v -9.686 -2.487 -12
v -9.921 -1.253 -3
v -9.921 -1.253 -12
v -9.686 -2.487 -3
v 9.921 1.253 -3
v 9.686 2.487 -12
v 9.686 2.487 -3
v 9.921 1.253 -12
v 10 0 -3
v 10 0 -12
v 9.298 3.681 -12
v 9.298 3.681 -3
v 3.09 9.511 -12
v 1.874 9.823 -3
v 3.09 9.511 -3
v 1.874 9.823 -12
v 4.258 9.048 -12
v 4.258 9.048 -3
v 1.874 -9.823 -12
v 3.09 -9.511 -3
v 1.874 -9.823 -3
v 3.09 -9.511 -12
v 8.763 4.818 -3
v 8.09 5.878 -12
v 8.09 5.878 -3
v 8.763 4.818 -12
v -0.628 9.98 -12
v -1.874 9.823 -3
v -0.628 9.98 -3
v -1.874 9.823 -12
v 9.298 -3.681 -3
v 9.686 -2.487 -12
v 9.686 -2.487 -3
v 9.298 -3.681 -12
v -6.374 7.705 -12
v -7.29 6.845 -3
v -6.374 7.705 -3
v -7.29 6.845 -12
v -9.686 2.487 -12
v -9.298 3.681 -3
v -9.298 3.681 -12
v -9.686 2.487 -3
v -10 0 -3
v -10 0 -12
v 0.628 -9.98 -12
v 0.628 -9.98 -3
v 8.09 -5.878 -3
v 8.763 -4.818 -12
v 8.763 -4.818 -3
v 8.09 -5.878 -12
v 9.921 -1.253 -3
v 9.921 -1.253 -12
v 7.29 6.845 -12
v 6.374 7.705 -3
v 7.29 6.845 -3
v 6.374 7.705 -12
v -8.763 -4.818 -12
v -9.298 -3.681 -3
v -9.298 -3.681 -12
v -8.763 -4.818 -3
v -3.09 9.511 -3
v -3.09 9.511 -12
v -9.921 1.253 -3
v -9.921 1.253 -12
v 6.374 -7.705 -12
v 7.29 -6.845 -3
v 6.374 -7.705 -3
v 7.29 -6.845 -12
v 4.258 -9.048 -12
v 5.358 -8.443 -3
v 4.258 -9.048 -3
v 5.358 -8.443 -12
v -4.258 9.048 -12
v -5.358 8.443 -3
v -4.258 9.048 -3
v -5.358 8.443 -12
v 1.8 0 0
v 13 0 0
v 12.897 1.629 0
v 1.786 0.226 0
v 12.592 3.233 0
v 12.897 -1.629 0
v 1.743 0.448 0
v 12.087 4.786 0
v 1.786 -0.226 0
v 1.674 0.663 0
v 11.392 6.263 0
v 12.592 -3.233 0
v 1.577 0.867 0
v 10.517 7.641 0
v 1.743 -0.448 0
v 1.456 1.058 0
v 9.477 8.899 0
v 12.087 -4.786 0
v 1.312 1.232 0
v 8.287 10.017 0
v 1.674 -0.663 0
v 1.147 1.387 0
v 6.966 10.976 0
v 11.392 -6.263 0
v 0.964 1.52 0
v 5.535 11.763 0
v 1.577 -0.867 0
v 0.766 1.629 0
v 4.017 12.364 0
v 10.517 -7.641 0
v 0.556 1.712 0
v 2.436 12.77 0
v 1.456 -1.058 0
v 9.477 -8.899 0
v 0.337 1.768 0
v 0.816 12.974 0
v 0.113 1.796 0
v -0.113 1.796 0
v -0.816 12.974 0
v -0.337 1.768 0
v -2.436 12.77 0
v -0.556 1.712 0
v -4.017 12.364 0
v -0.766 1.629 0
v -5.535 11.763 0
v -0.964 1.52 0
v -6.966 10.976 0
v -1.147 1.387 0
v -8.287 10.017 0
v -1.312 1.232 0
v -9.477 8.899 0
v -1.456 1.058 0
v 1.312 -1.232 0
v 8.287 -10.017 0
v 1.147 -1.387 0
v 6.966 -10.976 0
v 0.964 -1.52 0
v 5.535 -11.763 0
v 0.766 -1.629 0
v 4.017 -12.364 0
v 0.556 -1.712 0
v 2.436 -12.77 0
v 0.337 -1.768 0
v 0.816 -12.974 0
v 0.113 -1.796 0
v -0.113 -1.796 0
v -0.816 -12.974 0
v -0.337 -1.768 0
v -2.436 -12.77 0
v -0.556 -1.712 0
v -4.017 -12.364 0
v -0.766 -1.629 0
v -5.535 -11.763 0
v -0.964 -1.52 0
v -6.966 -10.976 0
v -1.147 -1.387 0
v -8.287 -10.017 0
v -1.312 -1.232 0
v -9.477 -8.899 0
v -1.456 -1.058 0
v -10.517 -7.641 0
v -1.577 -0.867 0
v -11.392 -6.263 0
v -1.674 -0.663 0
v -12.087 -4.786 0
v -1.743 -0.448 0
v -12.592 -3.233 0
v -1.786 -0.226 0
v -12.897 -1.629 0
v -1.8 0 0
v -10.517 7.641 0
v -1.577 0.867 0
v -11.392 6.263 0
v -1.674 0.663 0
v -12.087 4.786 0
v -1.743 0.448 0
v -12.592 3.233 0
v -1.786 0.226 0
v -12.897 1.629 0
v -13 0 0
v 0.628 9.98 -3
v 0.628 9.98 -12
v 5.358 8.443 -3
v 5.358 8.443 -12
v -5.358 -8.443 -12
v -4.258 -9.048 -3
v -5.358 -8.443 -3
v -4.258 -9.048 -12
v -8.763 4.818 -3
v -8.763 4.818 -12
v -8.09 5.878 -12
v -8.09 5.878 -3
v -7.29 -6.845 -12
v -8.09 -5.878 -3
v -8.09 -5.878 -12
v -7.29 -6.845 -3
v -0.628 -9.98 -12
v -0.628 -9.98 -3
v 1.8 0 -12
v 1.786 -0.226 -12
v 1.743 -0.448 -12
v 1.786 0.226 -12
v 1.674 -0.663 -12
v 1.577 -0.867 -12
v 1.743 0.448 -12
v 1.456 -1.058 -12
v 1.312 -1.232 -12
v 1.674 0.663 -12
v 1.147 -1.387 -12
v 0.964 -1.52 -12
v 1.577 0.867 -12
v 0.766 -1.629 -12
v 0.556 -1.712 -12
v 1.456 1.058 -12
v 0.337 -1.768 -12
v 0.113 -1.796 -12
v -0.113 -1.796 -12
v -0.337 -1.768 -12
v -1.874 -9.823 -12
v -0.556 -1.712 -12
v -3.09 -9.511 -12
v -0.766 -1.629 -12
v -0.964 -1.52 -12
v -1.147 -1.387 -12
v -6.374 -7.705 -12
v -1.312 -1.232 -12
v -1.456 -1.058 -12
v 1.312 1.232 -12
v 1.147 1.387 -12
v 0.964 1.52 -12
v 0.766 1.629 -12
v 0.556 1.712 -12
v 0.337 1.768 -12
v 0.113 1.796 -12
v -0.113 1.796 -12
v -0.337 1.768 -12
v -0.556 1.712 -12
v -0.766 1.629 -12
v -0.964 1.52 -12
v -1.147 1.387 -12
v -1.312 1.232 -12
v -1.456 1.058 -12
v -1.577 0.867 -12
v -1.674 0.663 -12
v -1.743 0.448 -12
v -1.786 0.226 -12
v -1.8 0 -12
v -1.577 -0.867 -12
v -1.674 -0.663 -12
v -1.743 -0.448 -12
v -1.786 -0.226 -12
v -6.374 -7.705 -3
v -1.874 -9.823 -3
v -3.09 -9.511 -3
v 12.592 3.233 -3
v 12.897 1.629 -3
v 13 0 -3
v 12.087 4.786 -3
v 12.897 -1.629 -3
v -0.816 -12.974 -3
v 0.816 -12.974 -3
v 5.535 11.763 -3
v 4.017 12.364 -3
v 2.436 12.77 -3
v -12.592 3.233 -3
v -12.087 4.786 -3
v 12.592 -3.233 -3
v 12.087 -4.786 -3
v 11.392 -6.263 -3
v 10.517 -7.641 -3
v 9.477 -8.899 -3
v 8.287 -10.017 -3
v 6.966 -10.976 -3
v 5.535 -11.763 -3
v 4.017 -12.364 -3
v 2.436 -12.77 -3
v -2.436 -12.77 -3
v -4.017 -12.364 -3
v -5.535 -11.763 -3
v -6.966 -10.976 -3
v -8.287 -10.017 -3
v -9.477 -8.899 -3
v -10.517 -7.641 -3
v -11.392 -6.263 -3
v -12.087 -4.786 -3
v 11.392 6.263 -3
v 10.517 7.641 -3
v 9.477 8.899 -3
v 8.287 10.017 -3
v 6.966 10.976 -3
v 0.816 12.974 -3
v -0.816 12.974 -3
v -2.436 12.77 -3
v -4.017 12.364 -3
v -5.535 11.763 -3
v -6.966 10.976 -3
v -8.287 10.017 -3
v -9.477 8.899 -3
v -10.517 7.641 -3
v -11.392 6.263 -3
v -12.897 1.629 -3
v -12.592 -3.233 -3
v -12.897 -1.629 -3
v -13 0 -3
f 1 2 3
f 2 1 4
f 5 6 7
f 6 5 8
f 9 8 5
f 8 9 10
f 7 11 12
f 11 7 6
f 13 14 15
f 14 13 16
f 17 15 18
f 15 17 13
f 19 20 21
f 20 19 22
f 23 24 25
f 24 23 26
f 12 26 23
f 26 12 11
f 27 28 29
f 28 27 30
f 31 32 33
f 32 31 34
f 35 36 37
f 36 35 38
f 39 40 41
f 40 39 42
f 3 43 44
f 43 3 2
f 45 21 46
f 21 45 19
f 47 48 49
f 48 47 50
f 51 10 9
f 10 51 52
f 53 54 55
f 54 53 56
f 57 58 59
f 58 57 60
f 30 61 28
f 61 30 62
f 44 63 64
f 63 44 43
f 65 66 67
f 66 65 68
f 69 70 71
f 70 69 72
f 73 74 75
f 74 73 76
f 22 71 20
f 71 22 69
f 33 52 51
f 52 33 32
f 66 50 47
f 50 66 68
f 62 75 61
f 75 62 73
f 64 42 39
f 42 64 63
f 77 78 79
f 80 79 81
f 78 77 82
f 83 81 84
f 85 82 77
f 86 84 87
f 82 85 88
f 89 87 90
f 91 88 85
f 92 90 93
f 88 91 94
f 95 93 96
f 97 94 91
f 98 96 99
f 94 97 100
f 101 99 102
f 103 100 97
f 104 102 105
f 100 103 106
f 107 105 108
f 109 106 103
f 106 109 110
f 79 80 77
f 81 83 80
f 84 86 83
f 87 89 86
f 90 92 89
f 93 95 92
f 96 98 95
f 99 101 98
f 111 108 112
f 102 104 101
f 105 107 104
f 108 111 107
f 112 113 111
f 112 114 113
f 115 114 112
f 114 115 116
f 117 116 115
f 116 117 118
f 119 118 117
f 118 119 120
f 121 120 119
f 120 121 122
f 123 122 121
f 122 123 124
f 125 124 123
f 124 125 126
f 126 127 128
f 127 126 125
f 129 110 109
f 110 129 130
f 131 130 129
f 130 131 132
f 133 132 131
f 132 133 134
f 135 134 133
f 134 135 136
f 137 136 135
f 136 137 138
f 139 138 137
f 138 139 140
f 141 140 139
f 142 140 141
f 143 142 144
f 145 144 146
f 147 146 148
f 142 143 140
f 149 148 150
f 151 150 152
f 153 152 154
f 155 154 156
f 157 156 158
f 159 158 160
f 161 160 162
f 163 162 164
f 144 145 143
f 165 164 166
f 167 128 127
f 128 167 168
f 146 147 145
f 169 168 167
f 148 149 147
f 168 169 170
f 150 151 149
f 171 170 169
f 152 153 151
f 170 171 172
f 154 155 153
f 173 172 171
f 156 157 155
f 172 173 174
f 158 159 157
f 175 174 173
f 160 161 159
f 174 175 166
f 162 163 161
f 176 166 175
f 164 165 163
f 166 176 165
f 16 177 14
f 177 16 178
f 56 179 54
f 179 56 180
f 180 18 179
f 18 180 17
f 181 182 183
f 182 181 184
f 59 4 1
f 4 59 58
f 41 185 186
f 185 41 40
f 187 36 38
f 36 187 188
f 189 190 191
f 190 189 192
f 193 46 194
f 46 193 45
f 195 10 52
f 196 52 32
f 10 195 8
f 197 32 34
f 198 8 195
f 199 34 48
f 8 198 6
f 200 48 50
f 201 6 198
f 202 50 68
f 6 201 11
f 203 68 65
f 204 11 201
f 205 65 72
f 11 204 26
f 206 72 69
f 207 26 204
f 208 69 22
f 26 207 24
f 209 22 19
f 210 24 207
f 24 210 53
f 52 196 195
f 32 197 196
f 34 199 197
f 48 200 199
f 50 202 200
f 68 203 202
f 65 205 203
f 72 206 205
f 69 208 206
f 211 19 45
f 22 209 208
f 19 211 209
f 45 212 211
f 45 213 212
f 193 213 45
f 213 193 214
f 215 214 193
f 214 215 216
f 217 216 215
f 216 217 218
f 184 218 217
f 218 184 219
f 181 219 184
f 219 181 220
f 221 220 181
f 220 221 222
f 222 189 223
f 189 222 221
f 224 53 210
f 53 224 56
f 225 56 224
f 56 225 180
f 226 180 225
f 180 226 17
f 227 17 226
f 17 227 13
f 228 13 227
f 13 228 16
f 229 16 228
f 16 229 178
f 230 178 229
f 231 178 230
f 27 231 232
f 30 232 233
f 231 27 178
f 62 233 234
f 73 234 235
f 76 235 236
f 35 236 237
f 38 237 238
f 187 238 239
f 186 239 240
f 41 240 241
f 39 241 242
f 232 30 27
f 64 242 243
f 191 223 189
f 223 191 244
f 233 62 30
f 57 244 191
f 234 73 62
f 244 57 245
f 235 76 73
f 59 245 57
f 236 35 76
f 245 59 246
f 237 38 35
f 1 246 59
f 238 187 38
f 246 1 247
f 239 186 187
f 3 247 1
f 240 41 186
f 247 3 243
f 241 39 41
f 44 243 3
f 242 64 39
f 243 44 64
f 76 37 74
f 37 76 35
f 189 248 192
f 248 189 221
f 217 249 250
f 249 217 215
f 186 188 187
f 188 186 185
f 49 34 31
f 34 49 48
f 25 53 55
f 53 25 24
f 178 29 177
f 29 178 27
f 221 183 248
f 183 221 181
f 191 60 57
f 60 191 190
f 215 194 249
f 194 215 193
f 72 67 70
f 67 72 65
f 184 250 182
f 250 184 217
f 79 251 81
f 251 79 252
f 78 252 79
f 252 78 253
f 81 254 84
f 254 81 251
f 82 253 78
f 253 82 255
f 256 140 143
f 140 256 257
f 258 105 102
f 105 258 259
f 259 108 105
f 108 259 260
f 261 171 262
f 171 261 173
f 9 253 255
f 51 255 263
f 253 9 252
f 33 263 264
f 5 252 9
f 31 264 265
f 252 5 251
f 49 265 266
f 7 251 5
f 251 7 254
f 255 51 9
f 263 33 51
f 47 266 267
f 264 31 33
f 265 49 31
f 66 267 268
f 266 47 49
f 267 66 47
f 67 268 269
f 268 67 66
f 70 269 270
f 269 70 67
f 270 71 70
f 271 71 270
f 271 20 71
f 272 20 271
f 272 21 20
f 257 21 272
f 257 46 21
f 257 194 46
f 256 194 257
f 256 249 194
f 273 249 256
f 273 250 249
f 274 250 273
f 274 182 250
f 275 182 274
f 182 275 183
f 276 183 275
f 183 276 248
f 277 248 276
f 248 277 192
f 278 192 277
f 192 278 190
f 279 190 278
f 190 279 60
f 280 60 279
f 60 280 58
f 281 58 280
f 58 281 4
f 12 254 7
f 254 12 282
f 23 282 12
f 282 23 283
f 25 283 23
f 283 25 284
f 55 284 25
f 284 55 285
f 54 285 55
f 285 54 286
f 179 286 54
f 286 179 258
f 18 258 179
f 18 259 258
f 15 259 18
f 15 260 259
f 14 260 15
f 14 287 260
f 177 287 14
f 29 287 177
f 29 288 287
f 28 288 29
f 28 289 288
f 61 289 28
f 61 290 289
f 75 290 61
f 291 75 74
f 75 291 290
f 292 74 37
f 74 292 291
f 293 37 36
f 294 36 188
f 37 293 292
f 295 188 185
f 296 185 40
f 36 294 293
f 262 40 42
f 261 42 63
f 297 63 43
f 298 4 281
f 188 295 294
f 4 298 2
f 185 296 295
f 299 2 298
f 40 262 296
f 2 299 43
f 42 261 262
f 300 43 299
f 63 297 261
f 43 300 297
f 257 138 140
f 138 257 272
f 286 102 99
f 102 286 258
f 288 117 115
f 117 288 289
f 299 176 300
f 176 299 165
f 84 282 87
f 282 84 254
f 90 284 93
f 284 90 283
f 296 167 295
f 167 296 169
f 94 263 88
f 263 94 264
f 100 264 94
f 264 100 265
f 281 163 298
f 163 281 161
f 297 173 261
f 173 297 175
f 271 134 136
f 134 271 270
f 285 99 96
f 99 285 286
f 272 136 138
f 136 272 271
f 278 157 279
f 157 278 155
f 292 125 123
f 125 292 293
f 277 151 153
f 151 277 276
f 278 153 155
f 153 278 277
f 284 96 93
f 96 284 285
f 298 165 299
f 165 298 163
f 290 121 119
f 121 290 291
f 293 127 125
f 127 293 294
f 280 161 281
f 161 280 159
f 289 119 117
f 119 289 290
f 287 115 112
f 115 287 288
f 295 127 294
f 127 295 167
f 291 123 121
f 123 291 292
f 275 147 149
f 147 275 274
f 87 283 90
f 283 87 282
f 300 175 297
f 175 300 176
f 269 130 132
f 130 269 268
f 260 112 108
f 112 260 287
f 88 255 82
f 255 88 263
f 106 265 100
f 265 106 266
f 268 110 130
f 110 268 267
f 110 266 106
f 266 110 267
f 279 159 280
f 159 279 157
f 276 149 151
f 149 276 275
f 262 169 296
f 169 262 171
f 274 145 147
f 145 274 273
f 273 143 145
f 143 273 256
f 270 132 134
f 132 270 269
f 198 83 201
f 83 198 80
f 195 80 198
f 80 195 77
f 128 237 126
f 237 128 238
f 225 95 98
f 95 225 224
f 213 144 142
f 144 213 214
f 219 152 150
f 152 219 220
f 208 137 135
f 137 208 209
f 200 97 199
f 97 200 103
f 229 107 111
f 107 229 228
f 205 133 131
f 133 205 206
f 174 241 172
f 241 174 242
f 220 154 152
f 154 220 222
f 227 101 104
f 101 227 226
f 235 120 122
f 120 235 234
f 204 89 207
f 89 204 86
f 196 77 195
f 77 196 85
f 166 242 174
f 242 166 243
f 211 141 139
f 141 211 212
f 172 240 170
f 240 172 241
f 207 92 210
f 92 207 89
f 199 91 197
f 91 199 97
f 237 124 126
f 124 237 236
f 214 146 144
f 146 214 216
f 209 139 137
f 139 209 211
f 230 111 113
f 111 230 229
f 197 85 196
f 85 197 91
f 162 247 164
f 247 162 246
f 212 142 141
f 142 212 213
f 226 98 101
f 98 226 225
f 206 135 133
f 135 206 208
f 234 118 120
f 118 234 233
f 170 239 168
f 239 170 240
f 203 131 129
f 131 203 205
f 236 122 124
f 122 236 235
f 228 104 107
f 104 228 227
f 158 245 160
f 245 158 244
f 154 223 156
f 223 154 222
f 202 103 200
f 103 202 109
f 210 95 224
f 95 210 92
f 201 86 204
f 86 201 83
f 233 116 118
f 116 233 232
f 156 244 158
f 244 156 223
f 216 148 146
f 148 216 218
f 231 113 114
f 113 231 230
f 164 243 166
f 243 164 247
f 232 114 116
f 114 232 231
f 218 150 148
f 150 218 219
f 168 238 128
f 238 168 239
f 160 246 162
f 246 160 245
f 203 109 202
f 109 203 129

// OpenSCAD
$fn = 50;


difference() {
	union() {
		translate(v = [0, 0, -12.0000000000]) {
			cylinder(h = 12, r = 10.0000000000);
		}
		translate(v = [0, 0, -3.0000000000]) {
			cylinder(h = 3, r = 13.0000000000);
		}
	}
	union() {
		#translate(v = [0, 0, -12]) {
			cylinder(h = 12, r = 1.8000000000);
		}
	}
}
